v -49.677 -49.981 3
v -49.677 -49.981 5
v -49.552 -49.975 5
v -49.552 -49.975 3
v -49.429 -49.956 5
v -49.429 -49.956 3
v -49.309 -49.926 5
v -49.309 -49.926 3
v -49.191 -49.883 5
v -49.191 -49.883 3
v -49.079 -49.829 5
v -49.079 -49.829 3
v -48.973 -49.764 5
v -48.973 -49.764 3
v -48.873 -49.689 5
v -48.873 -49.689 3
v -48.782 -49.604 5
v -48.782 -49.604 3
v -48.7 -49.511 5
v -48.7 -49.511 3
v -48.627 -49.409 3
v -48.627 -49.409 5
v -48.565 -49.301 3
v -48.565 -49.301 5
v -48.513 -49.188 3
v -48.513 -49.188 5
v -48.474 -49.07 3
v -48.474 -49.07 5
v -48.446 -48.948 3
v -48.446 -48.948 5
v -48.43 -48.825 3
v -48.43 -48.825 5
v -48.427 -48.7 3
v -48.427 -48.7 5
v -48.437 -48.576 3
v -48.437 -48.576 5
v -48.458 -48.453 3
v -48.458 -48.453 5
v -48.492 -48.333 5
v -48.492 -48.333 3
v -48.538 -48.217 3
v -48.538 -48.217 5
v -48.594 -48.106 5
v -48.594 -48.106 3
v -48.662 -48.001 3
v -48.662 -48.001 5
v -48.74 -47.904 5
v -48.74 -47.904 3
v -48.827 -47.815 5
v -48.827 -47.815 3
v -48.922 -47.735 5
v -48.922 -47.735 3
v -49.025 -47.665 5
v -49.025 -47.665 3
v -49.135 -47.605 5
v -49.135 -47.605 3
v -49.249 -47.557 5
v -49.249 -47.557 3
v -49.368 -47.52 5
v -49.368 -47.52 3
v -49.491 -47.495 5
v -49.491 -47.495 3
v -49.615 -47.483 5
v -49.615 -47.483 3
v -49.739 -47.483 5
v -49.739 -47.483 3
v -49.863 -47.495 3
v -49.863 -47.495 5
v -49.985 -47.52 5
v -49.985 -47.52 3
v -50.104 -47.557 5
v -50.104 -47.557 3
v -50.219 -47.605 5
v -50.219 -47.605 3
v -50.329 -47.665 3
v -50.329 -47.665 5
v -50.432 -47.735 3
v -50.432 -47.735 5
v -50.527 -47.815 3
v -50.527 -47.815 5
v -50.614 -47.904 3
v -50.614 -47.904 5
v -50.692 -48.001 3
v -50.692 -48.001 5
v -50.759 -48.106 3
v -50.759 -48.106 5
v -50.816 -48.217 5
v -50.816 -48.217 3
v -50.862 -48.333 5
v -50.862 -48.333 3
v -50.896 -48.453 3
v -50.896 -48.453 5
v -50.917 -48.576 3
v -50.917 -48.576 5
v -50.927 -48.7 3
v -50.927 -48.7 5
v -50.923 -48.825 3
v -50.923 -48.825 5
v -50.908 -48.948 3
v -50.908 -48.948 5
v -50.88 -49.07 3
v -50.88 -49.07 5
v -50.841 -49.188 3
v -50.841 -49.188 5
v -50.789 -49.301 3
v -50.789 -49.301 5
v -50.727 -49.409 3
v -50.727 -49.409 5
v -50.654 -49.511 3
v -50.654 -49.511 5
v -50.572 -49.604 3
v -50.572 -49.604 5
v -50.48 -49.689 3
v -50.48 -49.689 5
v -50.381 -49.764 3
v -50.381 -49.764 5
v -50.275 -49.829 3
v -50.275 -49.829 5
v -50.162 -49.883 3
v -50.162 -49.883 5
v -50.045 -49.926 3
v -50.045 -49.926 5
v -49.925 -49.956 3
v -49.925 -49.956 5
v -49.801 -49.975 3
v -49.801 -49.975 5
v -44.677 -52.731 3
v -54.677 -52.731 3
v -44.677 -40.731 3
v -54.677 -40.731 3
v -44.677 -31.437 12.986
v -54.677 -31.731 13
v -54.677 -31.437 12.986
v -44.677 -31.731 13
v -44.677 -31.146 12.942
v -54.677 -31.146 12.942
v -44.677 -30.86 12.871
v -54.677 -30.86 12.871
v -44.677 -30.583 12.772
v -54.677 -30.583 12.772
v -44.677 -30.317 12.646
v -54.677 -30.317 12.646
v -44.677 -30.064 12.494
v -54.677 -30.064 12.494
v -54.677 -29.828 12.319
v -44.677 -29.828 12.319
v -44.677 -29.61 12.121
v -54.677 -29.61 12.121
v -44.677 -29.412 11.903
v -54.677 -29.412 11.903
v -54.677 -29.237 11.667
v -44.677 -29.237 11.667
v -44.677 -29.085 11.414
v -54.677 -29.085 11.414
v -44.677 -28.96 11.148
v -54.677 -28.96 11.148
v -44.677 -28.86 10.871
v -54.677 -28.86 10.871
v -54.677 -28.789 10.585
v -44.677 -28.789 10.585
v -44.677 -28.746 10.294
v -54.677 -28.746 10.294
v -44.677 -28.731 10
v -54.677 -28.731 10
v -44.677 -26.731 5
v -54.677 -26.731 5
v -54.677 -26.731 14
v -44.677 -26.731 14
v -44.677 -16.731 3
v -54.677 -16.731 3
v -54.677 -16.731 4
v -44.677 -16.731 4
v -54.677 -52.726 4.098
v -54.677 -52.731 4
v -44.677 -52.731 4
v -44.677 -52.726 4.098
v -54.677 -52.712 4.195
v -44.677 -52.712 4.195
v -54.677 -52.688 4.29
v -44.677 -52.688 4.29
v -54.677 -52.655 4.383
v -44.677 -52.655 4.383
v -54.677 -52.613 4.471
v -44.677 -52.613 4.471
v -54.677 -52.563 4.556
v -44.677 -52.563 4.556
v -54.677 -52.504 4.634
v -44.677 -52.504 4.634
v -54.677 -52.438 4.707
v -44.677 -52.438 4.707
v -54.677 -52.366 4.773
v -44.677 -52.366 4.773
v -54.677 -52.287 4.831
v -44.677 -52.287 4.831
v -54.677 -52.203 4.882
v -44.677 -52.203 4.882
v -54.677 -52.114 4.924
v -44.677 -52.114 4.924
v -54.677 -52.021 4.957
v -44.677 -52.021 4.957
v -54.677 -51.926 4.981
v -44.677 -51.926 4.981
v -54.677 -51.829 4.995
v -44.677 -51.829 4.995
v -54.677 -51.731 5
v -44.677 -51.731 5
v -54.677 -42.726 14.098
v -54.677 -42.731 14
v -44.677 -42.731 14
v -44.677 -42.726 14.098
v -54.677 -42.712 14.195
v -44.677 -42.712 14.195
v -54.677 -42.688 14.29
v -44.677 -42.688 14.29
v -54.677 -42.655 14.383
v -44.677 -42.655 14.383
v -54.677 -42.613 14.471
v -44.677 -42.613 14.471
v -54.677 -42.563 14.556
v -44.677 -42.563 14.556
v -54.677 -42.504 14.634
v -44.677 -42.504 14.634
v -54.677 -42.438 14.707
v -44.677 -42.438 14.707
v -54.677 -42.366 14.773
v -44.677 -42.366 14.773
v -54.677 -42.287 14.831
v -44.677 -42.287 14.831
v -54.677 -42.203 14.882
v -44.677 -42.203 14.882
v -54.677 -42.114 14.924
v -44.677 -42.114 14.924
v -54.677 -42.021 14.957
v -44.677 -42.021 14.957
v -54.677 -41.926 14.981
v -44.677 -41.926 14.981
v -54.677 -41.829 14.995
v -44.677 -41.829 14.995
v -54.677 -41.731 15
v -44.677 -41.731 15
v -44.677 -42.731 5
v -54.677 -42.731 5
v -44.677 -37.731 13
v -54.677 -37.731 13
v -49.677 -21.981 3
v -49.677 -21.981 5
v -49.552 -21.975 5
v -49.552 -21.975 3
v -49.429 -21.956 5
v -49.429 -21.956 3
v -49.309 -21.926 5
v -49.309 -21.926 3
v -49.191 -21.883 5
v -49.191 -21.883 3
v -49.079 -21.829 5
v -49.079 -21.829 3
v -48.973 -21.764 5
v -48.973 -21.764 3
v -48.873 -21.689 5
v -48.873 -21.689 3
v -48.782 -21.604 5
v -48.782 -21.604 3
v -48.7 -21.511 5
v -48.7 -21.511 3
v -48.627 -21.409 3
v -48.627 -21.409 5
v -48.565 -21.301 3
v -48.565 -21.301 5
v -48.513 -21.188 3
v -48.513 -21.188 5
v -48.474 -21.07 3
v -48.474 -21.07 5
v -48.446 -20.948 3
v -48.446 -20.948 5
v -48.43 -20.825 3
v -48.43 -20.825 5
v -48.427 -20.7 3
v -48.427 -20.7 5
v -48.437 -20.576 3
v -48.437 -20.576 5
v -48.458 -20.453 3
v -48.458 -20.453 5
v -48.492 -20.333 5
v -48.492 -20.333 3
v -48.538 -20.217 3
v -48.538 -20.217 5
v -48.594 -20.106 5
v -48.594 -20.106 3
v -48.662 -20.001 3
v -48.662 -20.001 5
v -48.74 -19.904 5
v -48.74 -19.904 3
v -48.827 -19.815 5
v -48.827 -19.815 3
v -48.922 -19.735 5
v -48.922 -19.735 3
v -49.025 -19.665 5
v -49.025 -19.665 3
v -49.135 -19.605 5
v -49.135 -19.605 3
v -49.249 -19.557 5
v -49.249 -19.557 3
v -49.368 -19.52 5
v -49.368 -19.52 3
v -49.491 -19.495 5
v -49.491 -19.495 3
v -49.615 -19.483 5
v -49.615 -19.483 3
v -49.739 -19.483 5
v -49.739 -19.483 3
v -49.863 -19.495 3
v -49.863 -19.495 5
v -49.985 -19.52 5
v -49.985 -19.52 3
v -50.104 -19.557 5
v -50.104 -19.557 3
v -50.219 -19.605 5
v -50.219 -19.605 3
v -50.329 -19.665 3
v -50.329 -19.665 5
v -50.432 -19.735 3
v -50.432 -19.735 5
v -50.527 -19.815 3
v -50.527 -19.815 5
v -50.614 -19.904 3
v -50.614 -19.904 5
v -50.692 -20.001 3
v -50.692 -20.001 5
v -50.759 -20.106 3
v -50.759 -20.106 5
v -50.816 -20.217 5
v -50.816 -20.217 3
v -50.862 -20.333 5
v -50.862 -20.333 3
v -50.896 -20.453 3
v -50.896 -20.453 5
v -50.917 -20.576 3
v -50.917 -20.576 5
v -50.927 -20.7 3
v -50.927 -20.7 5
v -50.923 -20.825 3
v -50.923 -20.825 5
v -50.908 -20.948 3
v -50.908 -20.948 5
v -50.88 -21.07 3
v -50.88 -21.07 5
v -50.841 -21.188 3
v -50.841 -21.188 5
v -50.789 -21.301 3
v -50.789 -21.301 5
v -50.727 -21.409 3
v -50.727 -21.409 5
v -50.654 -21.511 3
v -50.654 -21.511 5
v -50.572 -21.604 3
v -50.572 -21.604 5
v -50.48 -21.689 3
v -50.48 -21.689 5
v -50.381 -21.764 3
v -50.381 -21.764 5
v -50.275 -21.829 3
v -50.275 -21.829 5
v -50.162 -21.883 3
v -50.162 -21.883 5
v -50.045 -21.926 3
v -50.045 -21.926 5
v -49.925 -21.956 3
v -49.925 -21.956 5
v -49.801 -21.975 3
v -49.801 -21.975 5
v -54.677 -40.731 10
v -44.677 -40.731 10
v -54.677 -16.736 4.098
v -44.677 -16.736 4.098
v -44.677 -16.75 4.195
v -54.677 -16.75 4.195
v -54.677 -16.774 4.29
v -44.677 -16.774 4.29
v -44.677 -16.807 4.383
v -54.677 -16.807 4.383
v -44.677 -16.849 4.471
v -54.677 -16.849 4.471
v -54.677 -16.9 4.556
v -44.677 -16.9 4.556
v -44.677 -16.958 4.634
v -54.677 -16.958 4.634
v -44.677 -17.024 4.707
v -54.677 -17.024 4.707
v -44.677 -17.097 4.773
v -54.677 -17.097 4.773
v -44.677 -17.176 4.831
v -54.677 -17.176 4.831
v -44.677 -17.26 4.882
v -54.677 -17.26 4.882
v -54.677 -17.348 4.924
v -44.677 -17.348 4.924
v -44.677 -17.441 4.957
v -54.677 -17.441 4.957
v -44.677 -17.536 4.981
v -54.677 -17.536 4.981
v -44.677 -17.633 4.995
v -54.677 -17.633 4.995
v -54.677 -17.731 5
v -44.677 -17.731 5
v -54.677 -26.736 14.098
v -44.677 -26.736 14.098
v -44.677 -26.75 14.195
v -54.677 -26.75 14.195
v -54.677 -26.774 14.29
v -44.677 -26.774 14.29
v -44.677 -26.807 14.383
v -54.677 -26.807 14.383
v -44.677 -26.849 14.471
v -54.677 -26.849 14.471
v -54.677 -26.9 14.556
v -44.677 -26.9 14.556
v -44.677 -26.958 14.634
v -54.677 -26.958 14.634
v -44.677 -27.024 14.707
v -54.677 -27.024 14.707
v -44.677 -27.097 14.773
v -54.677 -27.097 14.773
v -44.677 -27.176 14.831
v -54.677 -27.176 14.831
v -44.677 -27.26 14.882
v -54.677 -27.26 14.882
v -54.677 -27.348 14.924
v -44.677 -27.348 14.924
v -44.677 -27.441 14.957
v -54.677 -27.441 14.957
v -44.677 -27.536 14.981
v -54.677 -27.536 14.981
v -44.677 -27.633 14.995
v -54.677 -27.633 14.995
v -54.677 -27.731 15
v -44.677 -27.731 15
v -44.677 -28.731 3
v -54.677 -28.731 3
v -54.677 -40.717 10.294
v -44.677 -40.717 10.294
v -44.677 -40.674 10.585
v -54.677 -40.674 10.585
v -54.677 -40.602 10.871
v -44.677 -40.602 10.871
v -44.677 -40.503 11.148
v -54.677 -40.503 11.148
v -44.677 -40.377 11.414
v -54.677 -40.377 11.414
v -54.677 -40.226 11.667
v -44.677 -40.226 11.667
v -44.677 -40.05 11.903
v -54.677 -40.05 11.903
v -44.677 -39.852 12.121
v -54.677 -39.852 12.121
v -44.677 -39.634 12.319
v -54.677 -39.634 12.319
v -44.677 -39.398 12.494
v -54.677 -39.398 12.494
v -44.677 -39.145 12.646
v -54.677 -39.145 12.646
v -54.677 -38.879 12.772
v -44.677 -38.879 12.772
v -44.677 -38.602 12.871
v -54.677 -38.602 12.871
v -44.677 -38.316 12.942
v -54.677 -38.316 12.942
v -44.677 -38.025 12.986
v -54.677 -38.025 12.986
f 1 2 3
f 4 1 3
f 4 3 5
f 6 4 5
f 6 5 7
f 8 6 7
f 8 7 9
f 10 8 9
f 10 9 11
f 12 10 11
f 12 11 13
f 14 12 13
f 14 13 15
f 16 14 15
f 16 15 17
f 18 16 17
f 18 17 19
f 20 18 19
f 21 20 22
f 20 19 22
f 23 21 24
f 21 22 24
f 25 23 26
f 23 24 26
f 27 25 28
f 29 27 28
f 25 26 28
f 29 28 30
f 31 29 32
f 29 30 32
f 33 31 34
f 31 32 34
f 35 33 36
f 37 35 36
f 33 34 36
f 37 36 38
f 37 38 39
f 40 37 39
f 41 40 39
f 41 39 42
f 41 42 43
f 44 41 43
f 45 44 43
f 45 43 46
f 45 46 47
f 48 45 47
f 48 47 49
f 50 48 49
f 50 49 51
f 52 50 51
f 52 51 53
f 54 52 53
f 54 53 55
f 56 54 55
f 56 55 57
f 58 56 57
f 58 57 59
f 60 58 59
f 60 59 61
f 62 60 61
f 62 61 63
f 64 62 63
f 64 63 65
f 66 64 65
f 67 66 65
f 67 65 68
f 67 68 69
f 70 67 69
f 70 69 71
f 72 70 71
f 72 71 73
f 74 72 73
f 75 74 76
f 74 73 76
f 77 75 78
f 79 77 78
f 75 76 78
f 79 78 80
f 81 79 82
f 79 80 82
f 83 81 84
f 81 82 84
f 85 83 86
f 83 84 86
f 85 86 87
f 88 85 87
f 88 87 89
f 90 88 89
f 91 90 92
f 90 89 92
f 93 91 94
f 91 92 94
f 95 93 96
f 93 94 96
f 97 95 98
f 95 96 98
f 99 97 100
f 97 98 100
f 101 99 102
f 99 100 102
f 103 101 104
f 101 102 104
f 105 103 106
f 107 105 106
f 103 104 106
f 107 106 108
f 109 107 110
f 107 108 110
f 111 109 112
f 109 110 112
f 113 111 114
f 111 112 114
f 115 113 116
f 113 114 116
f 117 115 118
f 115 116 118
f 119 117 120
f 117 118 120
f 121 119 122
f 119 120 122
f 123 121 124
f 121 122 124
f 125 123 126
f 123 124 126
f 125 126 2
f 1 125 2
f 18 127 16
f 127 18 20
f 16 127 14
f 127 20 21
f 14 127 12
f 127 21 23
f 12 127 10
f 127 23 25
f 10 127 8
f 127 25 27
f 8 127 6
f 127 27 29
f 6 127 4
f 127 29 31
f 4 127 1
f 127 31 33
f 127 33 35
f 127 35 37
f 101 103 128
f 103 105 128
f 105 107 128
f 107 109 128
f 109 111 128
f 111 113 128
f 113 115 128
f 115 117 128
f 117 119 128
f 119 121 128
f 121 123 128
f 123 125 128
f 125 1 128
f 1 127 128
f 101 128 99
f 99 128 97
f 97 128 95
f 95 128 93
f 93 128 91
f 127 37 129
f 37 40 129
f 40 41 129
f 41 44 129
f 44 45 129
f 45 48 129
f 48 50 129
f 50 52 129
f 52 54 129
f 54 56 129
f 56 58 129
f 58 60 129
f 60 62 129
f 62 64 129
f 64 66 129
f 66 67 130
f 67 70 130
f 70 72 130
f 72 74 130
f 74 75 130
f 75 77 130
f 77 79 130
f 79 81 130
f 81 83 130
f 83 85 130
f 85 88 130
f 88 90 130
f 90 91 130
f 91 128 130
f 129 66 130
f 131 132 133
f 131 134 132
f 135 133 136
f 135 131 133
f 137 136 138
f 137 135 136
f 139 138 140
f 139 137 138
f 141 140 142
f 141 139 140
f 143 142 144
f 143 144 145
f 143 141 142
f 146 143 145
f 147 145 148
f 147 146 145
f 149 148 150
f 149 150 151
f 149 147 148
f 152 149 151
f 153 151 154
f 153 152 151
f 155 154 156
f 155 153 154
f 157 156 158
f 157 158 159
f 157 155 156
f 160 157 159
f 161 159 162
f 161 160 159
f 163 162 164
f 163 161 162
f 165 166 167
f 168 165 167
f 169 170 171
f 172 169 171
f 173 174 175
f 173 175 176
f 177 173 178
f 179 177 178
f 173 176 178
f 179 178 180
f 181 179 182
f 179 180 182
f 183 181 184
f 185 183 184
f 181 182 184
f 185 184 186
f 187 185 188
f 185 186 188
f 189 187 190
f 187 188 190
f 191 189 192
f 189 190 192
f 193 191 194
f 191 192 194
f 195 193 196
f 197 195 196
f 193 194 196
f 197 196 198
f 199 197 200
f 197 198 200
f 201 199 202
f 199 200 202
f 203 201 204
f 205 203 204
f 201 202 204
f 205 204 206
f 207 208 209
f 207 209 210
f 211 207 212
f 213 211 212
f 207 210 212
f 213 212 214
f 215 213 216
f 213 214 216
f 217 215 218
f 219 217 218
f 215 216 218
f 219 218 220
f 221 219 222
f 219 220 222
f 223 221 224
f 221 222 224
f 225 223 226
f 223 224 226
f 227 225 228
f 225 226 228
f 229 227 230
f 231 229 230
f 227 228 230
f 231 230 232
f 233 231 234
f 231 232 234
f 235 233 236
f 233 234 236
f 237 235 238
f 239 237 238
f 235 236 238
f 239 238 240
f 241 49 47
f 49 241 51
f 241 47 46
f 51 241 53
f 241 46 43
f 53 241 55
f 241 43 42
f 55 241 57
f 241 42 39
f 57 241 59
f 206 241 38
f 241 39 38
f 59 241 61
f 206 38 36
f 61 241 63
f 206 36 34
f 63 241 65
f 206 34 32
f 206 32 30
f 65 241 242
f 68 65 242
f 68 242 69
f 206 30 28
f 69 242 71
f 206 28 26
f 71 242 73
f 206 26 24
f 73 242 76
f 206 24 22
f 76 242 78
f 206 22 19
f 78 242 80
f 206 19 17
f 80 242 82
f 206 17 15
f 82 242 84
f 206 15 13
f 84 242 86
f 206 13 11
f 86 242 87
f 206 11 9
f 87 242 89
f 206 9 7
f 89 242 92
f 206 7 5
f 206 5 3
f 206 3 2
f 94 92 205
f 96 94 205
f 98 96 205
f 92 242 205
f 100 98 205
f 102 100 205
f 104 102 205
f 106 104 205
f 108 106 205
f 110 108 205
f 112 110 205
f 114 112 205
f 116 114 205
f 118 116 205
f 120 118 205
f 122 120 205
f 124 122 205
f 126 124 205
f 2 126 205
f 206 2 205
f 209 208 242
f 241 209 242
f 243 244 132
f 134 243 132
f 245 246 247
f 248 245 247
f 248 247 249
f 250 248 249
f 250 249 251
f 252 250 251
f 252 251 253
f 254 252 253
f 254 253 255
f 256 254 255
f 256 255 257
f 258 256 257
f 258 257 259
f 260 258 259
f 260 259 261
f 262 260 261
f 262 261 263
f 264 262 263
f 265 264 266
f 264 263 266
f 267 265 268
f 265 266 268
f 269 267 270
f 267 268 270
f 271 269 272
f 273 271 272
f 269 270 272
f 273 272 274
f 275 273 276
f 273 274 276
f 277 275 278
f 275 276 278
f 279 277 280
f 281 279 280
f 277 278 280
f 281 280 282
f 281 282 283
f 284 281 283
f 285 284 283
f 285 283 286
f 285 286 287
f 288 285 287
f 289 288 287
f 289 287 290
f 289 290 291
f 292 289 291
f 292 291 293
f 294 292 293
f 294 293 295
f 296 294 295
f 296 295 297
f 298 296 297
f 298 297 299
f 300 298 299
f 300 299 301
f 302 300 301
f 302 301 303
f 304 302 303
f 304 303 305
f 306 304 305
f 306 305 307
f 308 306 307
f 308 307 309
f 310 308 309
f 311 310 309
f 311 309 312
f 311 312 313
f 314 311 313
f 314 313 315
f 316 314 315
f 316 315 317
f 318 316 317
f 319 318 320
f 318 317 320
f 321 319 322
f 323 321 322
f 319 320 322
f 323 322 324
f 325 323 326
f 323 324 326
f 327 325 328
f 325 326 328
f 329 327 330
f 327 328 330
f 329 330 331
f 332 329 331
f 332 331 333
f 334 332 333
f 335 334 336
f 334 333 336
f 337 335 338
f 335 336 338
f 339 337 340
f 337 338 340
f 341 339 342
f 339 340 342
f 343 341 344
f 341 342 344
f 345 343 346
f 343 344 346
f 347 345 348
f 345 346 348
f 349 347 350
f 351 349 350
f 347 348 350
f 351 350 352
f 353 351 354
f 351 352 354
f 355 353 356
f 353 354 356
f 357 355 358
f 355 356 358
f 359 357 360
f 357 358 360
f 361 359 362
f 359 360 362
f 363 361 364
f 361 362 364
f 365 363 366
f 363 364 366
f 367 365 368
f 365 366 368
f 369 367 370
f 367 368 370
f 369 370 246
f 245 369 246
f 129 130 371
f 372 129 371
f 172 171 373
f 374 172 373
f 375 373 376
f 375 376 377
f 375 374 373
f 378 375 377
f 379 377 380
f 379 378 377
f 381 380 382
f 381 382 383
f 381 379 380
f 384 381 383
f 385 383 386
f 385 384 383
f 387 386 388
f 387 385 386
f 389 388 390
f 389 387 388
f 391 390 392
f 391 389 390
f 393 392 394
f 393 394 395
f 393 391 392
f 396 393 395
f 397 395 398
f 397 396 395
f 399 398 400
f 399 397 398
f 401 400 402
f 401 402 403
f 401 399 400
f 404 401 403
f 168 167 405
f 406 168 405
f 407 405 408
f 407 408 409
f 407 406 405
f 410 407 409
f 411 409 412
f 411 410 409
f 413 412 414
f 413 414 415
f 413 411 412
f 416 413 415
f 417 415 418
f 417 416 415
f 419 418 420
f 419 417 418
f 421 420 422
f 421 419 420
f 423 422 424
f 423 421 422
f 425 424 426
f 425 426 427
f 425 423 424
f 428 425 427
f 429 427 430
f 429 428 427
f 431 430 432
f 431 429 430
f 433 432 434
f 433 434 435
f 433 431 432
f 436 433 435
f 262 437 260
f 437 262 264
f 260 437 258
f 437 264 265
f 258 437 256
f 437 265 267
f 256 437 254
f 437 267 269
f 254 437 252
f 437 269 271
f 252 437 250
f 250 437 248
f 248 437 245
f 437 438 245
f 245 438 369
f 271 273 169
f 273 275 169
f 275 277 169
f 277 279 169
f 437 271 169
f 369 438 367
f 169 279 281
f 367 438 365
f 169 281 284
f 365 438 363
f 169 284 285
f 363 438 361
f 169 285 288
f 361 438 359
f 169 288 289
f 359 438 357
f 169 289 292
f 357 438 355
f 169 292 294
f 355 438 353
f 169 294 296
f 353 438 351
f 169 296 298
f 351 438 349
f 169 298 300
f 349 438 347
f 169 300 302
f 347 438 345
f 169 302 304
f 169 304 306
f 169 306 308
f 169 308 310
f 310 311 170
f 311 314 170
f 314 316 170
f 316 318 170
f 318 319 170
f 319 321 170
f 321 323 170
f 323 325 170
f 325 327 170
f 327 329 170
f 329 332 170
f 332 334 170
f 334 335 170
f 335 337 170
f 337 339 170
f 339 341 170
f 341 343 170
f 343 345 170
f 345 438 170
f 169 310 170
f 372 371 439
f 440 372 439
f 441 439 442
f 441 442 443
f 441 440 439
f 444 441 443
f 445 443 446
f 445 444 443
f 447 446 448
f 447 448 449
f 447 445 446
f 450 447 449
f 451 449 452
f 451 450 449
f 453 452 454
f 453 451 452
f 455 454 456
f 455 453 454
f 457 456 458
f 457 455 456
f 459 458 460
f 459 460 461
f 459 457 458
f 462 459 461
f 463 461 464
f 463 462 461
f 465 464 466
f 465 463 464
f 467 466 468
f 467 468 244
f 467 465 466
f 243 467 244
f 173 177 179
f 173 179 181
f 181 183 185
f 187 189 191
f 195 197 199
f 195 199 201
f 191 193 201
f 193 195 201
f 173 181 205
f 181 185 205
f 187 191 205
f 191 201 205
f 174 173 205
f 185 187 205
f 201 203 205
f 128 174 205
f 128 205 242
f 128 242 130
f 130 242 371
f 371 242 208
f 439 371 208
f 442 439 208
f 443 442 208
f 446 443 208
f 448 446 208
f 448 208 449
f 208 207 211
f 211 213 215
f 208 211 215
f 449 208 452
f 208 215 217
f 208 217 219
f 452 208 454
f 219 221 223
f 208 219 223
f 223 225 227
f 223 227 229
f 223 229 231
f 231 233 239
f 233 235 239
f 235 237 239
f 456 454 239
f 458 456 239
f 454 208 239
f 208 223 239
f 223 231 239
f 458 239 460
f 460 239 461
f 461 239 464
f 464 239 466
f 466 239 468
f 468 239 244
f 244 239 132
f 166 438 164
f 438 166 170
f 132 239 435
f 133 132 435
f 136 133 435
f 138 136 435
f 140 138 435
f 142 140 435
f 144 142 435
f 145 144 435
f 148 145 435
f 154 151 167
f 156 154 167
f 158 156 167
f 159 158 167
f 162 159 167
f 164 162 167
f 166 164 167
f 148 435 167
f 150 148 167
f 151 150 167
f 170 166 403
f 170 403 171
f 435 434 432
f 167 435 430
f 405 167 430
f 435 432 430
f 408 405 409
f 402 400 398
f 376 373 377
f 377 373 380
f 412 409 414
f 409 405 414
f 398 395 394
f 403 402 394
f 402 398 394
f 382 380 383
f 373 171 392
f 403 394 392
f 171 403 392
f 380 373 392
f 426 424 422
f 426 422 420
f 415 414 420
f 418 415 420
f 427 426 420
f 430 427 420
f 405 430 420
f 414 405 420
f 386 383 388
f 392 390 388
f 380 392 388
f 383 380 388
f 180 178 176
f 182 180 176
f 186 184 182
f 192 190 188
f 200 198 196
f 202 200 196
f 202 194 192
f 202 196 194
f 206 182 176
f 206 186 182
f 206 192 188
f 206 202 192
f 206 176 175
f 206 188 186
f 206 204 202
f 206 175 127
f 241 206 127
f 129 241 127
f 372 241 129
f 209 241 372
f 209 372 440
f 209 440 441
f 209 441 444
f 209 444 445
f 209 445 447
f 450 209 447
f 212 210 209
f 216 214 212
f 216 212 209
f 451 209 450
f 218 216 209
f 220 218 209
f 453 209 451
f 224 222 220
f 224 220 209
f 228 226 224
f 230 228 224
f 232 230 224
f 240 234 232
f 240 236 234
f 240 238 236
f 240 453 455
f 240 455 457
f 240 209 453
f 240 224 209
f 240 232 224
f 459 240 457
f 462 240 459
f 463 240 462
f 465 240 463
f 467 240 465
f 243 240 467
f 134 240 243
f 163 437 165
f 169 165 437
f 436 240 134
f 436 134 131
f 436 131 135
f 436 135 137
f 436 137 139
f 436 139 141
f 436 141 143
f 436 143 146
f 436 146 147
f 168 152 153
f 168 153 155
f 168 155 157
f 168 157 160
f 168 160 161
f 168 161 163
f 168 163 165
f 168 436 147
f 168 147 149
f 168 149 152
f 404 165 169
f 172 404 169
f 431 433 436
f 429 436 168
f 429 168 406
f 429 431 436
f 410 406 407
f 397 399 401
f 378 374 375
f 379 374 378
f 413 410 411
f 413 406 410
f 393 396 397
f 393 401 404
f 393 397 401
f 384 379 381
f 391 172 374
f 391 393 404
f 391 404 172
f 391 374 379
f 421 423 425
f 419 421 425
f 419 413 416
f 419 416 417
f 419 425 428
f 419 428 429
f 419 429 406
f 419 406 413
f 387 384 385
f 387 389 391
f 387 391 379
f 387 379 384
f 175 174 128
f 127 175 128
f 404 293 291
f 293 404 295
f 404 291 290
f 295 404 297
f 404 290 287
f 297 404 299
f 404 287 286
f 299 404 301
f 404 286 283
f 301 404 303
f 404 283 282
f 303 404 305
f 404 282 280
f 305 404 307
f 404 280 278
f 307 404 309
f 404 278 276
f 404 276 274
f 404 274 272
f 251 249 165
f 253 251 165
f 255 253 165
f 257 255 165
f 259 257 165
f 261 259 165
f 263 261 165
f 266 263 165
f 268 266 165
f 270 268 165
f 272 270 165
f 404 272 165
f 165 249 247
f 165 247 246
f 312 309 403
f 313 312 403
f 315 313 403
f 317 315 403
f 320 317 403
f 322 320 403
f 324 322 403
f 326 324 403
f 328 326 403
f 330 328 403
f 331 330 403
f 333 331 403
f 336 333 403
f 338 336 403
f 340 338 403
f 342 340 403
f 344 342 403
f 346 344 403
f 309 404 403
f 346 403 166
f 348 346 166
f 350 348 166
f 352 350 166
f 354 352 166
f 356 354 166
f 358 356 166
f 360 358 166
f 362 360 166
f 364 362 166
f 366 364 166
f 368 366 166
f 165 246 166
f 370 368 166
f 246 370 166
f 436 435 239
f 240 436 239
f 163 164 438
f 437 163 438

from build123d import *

# Parameters (mm, degrees)
PAD002_DEPTH    = 10
FILLET010_R     = 3
FILLET011_R     = 3
FILLET012_R     = 1
SKETCH002_R     = 1.25
POCKET001_DEPTH = 2.001


with BuildPart() as part:
    # CopyCopySketch004 → Pad002 (new body)
    with BuildSketch(Plane.YZ):
        Polygon((-6, 3), (-6, 13), (6, 13), (6, 3), (18, 3), (18, 5), (8, 5), (8, 15), (-8, 15), (-8, 5), (-18, 5), (-18, 3), align=None)
    extrude(amount=PAD002_DEPTH)

    # Fillet010
    fillet010_edges = [part.edges().sort_by_distance(p)[0] for p in [
        (5, -6, 13),
    ]]
    fillet(fillet010_edges, radius=FILLET010_R)

    # Fillet011
    fillet011_edges = [part.edges().sort_by_distance(p)[0] for p in [
        (5, 6, 13),
    ]]
    fillet(fillet011_edges, radius=FILLET011_R)

    # Fillet012
    fillet012_edges = [part.edges().sort_by_distance(p)[0] for p in [
        (5, 18, 5),
        (5, 8, 15),
        (5, -8, 15),
        (5, -18, 5),
    ]]
    fillet(fillet012_edges, radius=FILLET012_R)

    # Sketch002 (on Face17 of Fillet012) → Pocket001 (cut, through all)
    with BuildSketch(Plane(origin=(0, 0, 5), x_dir=(0, -1, 0), z_dir=(0, 0, 1))):
        with Locations((14, 5)):
            Circle(SKETCH002_R)
        with Locations((-14, 5)):
            Circle(SKETCH002_R)
    extrude(amount=-POCKET001_DEPTH, mode=Mode.SUBTRACT)


with BuildPart() as part_1:
    # Body003 placement: moved
    add(part.part.moved(Location((-54.676946, -34.731148, 0))))


solid = part_1.part
